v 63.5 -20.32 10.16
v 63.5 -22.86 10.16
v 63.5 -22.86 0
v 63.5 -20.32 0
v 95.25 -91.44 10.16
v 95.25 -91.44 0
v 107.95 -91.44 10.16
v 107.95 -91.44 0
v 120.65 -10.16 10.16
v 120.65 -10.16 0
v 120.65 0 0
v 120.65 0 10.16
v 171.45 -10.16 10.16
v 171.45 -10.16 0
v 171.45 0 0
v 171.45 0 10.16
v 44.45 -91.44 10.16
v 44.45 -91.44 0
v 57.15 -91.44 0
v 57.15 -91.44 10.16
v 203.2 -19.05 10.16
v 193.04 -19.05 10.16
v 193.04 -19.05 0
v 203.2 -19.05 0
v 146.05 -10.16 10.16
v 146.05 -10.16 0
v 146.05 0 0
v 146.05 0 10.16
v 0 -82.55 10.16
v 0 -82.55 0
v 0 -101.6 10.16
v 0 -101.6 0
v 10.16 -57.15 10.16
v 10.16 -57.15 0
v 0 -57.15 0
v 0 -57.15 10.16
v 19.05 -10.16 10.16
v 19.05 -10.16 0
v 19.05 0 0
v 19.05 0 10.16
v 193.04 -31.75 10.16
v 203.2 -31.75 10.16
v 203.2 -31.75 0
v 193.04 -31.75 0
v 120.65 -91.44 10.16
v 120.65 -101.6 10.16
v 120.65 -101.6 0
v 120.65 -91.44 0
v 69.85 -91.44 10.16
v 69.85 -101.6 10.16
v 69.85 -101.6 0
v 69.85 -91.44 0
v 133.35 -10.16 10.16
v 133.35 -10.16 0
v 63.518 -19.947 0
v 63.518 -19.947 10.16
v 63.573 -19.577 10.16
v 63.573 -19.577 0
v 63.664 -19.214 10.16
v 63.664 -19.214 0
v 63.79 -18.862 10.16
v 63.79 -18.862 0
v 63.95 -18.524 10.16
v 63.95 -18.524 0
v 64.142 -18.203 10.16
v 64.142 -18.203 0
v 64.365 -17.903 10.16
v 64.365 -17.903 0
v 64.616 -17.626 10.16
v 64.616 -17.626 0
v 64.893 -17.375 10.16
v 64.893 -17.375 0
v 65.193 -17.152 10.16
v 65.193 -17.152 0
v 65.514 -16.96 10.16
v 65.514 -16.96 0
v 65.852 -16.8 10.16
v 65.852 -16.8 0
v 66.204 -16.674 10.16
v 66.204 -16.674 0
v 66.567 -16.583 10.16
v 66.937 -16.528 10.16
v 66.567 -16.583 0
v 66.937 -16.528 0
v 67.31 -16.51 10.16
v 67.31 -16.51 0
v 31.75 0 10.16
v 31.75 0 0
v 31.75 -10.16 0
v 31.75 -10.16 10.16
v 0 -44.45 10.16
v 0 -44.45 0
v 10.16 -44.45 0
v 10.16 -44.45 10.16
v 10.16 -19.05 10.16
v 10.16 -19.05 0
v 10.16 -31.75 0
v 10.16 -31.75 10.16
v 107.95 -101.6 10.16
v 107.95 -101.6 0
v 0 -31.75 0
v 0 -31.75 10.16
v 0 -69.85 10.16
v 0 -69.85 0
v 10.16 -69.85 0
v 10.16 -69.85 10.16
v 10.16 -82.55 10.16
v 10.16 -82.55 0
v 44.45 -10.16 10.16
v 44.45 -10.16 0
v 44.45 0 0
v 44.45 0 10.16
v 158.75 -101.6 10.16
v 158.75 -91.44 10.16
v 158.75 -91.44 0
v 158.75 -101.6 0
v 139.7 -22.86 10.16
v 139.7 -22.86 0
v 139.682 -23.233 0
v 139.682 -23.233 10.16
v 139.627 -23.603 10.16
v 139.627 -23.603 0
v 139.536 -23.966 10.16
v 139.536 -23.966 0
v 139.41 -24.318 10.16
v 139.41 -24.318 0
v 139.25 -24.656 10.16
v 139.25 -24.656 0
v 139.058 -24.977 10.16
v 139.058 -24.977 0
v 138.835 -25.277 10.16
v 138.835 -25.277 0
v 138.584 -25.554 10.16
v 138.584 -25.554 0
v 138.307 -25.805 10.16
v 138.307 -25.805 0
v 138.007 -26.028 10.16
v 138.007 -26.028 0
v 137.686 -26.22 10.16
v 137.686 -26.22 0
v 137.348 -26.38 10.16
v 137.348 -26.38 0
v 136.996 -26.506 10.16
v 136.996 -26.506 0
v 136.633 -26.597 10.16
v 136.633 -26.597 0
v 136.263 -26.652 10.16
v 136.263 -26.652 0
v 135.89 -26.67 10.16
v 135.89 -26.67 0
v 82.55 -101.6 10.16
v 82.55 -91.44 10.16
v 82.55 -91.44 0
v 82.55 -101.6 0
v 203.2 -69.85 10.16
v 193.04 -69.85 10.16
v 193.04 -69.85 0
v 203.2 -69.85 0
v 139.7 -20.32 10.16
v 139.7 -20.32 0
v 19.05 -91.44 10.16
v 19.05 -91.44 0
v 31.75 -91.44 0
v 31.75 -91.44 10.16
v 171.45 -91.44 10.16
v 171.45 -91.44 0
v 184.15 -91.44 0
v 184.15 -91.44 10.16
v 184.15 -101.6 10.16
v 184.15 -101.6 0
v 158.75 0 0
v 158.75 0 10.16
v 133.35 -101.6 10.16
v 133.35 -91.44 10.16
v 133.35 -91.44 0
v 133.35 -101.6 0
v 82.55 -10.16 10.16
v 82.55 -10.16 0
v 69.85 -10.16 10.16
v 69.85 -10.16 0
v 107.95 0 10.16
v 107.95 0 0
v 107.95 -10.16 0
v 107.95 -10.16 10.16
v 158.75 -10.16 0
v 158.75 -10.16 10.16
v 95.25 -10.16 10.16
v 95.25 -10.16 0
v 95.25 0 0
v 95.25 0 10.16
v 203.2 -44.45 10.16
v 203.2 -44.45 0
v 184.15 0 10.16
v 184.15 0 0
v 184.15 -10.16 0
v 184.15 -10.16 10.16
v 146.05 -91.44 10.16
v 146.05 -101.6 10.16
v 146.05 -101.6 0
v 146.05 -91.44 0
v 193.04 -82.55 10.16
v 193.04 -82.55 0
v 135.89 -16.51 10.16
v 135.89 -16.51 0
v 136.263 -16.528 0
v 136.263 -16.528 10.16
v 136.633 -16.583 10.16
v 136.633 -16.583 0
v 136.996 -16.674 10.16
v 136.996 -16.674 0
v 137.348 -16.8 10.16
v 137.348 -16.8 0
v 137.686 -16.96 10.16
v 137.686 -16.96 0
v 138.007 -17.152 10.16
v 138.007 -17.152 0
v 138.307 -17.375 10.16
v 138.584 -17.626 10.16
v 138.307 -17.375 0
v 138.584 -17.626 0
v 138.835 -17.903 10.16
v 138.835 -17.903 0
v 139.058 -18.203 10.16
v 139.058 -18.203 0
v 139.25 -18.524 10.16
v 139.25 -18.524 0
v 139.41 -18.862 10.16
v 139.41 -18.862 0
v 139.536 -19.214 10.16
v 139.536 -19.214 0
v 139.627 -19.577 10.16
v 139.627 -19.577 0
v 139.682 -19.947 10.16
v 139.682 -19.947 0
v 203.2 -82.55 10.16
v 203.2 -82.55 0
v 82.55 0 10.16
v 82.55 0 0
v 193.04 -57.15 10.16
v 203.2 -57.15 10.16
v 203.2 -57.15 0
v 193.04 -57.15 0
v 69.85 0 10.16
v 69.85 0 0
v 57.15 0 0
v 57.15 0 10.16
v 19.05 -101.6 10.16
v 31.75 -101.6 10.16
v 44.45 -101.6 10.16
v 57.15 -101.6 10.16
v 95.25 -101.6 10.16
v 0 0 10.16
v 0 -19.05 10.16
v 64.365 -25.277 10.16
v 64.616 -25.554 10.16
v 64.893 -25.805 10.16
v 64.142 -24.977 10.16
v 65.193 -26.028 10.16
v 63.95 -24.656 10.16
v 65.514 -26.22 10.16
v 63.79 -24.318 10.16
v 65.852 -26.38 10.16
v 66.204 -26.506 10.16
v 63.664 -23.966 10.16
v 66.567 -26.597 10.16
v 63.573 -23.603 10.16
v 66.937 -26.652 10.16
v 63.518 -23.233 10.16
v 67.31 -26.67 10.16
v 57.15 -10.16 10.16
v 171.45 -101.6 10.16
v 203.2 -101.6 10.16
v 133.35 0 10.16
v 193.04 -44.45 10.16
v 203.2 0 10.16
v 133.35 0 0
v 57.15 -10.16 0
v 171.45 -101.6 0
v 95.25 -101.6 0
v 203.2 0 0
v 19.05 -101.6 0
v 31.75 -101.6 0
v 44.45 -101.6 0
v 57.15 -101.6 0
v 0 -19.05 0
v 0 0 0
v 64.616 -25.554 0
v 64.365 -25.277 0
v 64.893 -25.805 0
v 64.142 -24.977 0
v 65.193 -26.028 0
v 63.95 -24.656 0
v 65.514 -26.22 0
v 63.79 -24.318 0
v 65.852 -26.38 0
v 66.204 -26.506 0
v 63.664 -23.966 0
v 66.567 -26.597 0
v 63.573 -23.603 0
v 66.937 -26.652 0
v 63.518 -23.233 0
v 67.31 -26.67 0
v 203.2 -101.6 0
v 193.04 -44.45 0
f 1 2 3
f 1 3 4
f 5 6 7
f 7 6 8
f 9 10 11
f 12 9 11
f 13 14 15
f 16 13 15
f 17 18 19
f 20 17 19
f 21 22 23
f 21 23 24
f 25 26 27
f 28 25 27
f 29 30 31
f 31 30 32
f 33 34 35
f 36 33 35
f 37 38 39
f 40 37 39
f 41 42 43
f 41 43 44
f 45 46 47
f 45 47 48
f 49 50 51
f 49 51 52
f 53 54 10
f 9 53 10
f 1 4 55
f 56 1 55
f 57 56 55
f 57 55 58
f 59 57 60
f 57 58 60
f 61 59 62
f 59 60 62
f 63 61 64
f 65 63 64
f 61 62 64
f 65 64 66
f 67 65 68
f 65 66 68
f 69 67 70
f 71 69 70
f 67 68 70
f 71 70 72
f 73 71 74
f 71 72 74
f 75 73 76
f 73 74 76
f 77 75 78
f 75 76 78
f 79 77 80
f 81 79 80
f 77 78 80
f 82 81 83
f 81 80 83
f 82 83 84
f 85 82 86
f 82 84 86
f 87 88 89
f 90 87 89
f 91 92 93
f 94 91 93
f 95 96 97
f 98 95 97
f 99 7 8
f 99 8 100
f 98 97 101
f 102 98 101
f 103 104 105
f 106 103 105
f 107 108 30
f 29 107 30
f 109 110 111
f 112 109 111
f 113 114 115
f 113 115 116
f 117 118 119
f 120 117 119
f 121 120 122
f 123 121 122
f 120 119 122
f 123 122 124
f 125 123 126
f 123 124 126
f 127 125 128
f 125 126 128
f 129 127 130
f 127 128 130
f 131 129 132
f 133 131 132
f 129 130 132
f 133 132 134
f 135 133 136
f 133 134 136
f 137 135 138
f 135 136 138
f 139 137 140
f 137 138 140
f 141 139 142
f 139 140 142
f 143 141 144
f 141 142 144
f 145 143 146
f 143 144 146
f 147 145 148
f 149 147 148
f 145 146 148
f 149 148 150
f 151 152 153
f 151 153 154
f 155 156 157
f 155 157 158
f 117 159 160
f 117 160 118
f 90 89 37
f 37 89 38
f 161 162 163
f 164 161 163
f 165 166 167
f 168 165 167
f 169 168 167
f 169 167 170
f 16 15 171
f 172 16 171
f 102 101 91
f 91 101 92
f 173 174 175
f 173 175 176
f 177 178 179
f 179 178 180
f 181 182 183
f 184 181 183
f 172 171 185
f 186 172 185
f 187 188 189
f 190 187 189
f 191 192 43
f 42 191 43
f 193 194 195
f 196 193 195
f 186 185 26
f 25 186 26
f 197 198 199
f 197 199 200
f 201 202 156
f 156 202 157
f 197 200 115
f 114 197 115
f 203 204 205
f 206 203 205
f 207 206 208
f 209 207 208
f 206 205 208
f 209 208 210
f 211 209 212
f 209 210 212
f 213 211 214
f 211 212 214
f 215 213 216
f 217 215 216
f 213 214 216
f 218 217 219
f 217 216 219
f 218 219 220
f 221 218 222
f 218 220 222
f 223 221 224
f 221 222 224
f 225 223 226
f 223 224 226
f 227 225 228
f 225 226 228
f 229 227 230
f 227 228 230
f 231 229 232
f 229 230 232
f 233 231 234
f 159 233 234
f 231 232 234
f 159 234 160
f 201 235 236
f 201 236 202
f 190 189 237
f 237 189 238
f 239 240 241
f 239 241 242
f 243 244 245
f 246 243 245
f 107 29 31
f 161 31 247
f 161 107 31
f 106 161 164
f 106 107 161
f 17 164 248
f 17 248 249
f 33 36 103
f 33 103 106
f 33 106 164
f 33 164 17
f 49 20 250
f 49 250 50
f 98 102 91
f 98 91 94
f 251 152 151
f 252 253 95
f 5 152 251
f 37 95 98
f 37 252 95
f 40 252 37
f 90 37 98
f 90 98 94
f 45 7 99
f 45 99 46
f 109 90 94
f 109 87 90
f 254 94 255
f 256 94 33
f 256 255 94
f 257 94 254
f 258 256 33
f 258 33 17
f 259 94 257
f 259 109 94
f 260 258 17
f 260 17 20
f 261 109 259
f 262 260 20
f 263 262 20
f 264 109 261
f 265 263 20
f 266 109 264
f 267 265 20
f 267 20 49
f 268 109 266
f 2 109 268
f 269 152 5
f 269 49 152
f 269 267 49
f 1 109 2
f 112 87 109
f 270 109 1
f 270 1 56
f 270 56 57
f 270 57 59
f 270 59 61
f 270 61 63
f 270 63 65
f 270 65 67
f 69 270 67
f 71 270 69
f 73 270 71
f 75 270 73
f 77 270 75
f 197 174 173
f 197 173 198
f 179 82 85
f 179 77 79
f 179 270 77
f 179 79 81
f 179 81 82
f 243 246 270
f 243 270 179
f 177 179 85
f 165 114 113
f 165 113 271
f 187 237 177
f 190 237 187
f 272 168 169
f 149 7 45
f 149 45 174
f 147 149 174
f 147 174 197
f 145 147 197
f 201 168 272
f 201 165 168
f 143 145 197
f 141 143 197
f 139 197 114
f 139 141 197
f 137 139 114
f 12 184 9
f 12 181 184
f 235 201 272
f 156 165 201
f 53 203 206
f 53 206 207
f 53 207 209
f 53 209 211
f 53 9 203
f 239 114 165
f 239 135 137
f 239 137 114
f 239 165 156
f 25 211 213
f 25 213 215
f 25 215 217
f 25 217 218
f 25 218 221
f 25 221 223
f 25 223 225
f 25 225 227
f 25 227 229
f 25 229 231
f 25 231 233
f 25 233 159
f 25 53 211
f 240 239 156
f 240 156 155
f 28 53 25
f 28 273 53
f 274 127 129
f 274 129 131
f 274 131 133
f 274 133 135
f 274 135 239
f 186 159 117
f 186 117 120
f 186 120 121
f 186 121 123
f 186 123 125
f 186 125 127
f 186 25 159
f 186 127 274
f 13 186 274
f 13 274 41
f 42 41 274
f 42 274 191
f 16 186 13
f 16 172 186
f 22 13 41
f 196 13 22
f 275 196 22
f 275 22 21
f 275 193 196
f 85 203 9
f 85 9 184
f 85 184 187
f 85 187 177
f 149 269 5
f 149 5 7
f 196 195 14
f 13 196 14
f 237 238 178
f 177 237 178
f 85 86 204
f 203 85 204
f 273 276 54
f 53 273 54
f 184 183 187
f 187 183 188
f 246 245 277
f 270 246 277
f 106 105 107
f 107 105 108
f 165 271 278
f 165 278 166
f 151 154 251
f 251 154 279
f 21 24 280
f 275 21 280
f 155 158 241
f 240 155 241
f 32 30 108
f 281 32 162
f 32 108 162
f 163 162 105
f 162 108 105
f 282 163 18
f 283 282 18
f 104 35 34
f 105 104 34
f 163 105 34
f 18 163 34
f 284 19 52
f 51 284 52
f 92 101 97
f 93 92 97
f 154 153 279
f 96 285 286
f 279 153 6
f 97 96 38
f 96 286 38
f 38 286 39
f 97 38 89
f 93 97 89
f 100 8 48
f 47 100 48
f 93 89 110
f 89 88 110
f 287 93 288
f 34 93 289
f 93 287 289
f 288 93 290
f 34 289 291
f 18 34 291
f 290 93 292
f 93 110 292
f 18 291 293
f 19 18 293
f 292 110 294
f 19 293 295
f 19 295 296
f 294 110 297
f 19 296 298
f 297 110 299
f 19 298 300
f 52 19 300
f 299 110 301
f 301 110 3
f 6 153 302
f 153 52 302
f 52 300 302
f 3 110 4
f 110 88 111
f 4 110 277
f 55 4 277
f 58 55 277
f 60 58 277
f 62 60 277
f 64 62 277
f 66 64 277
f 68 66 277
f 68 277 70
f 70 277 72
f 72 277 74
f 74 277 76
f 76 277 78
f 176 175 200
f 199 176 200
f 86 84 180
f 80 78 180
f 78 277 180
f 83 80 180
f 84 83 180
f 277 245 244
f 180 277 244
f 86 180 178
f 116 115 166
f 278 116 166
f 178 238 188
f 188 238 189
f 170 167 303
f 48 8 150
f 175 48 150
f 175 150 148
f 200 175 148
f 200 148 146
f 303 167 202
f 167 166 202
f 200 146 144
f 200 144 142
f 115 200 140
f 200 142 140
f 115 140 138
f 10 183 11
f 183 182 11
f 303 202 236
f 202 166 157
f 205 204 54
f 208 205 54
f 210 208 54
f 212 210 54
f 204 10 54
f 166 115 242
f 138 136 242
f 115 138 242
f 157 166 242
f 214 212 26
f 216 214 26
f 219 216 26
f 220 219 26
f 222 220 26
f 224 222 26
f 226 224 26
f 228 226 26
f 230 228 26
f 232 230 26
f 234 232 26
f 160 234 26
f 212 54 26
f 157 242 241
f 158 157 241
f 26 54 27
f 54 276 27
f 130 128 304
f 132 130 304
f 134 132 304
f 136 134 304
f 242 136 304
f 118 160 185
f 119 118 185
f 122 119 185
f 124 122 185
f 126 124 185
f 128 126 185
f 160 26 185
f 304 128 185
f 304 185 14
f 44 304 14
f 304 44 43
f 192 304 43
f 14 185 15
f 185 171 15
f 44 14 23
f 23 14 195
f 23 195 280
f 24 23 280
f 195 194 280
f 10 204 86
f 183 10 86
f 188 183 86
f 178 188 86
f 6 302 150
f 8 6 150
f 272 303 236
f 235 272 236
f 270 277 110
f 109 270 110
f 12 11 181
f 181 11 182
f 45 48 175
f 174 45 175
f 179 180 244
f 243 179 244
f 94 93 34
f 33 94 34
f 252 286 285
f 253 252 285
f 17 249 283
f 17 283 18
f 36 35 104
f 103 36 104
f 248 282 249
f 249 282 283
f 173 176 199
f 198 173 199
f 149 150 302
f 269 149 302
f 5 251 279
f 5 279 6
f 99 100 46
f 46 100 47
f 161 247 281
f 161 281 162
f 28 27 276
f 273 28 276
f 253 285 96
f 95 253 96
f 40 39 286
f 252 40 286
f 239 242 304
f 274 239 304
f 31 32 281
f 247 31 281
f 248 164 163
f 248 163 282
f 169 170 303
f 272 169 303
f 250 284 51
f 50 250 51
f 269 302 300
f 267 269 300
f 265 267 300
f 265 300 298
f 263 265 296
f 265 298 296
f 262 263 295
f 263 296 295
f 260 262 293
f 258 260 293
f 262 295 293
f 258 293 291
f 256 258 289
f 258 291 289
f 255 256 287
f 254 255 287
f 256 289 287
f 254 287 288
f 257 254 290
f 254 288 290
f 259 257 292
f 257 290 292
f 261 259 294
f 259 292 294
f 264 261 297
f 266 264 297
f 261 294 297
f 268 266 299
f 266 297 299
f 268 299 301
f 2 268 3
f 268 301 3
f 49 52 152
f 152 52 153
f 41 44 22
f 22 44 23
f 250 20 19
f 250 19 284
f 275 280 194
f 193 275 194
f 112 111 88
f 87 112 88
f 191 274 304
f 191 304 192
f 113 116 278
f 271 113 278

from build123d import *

# Parameters (mm, degrees)
F1_DEPTH = 10.16


with BuildPart() as f1:
    # F0 (on Top) → F1 (new body)
    with BuildSketch(Plane.XY):
        Polygon((19.05, 0), (0, 0), (0, -19.05), (10.16, -19.05), (10.16, -31.75), (0, -31.75), (0, -44.45), (10.16, -44.45), (10.16, -57.15), (0, -57.15), (0, -69.85), (10.16, -69.85), (10.16, -82.55), (0, -82.55), (0, -101.6), (19.05, -101.6), (19.05, -91.44), (31.75, -91.44), (31.75, -101.6), (44.45, -101.6), (44.45, -91.44), (57.15, -91.44), (57.15, -101.6), (69.85, -101.6), (69.85, -91.44), (82.55, -91.44), (82.55, -101.6), (95.25, -101.6), (95.25, -91.44), (107.95, -91.44), (107.95, -101.6), (120.65, -101.6), (120.65, -91.44), (133.35, -91.44), (133.35, -101.6), (146.05, -101.6), (146.05, -91.44), (158.75, -91.44), (158.75, -101.6), (171.45, -101.6), (171.45, -91.44), (184.15, -91.44), (184.15, -101.6), (203.2, -101.6), (203.2, -82.55), (193.04, -82.55), (193.04, -69.85), (203.2, -69.85), (203.2, -57.15), (193.04, -57.15), (193.04, -44.45), (203.2, -44.45), (203.2, -31.75), (193.04, -31.75), (193.04, -19.05), (203.2, -19.05), (203.2, 0), (184.15, 0), (184.15, -10.16), (171.45, -10.16), (171.45, 0), (158.75, 0), (158.75, -10.16), (146.05, -10.16), (146.05, 0), (133.35, 0), (133.35, -10.16), (120.65, -10.16), (120.65, 0), (107.95, 0), (107.95, -10.16), (95.25, -10.16), (95.25, 0), (82.55, 0), (82.55, -10.16), (69.85, -10.16), (69.85, 0), (57.15, 0), (57.15, -10.16), (44.45, -10.16), (44.45, 0), (31.75, 0), (31.75, -10.16), (19.05, -10.16), align=None)
        with BuildLine():
            ThreePointArc((63.5, -20.32), (64.615923, -17.625923), (67.31, -16.51))
            Line((67.31, -16.51), (135.89, -16.51))
            ThreePointArc((135.89, -16.51), (138.584077, -17.625923), (139.7, -20.32))
            Line((139.7, -20.32), (139.7, -22.86))
            ThreePointArc((139.7, -22.86), (138.584077, -25.554077), (135.89, -26.67))
            Line((135.89, -26.67), (67.31, -26.67))
            ThreePointArc((67.31, -26.67), (64.615923, -25.554077), (63.5, -22.86))
            Line((63.5, -22.86), (63.5, -20.32))
        make_face(mode=Mode.SUBTRACT)
    extrude(amount=F1_DEPTH)


solid = f1.part
